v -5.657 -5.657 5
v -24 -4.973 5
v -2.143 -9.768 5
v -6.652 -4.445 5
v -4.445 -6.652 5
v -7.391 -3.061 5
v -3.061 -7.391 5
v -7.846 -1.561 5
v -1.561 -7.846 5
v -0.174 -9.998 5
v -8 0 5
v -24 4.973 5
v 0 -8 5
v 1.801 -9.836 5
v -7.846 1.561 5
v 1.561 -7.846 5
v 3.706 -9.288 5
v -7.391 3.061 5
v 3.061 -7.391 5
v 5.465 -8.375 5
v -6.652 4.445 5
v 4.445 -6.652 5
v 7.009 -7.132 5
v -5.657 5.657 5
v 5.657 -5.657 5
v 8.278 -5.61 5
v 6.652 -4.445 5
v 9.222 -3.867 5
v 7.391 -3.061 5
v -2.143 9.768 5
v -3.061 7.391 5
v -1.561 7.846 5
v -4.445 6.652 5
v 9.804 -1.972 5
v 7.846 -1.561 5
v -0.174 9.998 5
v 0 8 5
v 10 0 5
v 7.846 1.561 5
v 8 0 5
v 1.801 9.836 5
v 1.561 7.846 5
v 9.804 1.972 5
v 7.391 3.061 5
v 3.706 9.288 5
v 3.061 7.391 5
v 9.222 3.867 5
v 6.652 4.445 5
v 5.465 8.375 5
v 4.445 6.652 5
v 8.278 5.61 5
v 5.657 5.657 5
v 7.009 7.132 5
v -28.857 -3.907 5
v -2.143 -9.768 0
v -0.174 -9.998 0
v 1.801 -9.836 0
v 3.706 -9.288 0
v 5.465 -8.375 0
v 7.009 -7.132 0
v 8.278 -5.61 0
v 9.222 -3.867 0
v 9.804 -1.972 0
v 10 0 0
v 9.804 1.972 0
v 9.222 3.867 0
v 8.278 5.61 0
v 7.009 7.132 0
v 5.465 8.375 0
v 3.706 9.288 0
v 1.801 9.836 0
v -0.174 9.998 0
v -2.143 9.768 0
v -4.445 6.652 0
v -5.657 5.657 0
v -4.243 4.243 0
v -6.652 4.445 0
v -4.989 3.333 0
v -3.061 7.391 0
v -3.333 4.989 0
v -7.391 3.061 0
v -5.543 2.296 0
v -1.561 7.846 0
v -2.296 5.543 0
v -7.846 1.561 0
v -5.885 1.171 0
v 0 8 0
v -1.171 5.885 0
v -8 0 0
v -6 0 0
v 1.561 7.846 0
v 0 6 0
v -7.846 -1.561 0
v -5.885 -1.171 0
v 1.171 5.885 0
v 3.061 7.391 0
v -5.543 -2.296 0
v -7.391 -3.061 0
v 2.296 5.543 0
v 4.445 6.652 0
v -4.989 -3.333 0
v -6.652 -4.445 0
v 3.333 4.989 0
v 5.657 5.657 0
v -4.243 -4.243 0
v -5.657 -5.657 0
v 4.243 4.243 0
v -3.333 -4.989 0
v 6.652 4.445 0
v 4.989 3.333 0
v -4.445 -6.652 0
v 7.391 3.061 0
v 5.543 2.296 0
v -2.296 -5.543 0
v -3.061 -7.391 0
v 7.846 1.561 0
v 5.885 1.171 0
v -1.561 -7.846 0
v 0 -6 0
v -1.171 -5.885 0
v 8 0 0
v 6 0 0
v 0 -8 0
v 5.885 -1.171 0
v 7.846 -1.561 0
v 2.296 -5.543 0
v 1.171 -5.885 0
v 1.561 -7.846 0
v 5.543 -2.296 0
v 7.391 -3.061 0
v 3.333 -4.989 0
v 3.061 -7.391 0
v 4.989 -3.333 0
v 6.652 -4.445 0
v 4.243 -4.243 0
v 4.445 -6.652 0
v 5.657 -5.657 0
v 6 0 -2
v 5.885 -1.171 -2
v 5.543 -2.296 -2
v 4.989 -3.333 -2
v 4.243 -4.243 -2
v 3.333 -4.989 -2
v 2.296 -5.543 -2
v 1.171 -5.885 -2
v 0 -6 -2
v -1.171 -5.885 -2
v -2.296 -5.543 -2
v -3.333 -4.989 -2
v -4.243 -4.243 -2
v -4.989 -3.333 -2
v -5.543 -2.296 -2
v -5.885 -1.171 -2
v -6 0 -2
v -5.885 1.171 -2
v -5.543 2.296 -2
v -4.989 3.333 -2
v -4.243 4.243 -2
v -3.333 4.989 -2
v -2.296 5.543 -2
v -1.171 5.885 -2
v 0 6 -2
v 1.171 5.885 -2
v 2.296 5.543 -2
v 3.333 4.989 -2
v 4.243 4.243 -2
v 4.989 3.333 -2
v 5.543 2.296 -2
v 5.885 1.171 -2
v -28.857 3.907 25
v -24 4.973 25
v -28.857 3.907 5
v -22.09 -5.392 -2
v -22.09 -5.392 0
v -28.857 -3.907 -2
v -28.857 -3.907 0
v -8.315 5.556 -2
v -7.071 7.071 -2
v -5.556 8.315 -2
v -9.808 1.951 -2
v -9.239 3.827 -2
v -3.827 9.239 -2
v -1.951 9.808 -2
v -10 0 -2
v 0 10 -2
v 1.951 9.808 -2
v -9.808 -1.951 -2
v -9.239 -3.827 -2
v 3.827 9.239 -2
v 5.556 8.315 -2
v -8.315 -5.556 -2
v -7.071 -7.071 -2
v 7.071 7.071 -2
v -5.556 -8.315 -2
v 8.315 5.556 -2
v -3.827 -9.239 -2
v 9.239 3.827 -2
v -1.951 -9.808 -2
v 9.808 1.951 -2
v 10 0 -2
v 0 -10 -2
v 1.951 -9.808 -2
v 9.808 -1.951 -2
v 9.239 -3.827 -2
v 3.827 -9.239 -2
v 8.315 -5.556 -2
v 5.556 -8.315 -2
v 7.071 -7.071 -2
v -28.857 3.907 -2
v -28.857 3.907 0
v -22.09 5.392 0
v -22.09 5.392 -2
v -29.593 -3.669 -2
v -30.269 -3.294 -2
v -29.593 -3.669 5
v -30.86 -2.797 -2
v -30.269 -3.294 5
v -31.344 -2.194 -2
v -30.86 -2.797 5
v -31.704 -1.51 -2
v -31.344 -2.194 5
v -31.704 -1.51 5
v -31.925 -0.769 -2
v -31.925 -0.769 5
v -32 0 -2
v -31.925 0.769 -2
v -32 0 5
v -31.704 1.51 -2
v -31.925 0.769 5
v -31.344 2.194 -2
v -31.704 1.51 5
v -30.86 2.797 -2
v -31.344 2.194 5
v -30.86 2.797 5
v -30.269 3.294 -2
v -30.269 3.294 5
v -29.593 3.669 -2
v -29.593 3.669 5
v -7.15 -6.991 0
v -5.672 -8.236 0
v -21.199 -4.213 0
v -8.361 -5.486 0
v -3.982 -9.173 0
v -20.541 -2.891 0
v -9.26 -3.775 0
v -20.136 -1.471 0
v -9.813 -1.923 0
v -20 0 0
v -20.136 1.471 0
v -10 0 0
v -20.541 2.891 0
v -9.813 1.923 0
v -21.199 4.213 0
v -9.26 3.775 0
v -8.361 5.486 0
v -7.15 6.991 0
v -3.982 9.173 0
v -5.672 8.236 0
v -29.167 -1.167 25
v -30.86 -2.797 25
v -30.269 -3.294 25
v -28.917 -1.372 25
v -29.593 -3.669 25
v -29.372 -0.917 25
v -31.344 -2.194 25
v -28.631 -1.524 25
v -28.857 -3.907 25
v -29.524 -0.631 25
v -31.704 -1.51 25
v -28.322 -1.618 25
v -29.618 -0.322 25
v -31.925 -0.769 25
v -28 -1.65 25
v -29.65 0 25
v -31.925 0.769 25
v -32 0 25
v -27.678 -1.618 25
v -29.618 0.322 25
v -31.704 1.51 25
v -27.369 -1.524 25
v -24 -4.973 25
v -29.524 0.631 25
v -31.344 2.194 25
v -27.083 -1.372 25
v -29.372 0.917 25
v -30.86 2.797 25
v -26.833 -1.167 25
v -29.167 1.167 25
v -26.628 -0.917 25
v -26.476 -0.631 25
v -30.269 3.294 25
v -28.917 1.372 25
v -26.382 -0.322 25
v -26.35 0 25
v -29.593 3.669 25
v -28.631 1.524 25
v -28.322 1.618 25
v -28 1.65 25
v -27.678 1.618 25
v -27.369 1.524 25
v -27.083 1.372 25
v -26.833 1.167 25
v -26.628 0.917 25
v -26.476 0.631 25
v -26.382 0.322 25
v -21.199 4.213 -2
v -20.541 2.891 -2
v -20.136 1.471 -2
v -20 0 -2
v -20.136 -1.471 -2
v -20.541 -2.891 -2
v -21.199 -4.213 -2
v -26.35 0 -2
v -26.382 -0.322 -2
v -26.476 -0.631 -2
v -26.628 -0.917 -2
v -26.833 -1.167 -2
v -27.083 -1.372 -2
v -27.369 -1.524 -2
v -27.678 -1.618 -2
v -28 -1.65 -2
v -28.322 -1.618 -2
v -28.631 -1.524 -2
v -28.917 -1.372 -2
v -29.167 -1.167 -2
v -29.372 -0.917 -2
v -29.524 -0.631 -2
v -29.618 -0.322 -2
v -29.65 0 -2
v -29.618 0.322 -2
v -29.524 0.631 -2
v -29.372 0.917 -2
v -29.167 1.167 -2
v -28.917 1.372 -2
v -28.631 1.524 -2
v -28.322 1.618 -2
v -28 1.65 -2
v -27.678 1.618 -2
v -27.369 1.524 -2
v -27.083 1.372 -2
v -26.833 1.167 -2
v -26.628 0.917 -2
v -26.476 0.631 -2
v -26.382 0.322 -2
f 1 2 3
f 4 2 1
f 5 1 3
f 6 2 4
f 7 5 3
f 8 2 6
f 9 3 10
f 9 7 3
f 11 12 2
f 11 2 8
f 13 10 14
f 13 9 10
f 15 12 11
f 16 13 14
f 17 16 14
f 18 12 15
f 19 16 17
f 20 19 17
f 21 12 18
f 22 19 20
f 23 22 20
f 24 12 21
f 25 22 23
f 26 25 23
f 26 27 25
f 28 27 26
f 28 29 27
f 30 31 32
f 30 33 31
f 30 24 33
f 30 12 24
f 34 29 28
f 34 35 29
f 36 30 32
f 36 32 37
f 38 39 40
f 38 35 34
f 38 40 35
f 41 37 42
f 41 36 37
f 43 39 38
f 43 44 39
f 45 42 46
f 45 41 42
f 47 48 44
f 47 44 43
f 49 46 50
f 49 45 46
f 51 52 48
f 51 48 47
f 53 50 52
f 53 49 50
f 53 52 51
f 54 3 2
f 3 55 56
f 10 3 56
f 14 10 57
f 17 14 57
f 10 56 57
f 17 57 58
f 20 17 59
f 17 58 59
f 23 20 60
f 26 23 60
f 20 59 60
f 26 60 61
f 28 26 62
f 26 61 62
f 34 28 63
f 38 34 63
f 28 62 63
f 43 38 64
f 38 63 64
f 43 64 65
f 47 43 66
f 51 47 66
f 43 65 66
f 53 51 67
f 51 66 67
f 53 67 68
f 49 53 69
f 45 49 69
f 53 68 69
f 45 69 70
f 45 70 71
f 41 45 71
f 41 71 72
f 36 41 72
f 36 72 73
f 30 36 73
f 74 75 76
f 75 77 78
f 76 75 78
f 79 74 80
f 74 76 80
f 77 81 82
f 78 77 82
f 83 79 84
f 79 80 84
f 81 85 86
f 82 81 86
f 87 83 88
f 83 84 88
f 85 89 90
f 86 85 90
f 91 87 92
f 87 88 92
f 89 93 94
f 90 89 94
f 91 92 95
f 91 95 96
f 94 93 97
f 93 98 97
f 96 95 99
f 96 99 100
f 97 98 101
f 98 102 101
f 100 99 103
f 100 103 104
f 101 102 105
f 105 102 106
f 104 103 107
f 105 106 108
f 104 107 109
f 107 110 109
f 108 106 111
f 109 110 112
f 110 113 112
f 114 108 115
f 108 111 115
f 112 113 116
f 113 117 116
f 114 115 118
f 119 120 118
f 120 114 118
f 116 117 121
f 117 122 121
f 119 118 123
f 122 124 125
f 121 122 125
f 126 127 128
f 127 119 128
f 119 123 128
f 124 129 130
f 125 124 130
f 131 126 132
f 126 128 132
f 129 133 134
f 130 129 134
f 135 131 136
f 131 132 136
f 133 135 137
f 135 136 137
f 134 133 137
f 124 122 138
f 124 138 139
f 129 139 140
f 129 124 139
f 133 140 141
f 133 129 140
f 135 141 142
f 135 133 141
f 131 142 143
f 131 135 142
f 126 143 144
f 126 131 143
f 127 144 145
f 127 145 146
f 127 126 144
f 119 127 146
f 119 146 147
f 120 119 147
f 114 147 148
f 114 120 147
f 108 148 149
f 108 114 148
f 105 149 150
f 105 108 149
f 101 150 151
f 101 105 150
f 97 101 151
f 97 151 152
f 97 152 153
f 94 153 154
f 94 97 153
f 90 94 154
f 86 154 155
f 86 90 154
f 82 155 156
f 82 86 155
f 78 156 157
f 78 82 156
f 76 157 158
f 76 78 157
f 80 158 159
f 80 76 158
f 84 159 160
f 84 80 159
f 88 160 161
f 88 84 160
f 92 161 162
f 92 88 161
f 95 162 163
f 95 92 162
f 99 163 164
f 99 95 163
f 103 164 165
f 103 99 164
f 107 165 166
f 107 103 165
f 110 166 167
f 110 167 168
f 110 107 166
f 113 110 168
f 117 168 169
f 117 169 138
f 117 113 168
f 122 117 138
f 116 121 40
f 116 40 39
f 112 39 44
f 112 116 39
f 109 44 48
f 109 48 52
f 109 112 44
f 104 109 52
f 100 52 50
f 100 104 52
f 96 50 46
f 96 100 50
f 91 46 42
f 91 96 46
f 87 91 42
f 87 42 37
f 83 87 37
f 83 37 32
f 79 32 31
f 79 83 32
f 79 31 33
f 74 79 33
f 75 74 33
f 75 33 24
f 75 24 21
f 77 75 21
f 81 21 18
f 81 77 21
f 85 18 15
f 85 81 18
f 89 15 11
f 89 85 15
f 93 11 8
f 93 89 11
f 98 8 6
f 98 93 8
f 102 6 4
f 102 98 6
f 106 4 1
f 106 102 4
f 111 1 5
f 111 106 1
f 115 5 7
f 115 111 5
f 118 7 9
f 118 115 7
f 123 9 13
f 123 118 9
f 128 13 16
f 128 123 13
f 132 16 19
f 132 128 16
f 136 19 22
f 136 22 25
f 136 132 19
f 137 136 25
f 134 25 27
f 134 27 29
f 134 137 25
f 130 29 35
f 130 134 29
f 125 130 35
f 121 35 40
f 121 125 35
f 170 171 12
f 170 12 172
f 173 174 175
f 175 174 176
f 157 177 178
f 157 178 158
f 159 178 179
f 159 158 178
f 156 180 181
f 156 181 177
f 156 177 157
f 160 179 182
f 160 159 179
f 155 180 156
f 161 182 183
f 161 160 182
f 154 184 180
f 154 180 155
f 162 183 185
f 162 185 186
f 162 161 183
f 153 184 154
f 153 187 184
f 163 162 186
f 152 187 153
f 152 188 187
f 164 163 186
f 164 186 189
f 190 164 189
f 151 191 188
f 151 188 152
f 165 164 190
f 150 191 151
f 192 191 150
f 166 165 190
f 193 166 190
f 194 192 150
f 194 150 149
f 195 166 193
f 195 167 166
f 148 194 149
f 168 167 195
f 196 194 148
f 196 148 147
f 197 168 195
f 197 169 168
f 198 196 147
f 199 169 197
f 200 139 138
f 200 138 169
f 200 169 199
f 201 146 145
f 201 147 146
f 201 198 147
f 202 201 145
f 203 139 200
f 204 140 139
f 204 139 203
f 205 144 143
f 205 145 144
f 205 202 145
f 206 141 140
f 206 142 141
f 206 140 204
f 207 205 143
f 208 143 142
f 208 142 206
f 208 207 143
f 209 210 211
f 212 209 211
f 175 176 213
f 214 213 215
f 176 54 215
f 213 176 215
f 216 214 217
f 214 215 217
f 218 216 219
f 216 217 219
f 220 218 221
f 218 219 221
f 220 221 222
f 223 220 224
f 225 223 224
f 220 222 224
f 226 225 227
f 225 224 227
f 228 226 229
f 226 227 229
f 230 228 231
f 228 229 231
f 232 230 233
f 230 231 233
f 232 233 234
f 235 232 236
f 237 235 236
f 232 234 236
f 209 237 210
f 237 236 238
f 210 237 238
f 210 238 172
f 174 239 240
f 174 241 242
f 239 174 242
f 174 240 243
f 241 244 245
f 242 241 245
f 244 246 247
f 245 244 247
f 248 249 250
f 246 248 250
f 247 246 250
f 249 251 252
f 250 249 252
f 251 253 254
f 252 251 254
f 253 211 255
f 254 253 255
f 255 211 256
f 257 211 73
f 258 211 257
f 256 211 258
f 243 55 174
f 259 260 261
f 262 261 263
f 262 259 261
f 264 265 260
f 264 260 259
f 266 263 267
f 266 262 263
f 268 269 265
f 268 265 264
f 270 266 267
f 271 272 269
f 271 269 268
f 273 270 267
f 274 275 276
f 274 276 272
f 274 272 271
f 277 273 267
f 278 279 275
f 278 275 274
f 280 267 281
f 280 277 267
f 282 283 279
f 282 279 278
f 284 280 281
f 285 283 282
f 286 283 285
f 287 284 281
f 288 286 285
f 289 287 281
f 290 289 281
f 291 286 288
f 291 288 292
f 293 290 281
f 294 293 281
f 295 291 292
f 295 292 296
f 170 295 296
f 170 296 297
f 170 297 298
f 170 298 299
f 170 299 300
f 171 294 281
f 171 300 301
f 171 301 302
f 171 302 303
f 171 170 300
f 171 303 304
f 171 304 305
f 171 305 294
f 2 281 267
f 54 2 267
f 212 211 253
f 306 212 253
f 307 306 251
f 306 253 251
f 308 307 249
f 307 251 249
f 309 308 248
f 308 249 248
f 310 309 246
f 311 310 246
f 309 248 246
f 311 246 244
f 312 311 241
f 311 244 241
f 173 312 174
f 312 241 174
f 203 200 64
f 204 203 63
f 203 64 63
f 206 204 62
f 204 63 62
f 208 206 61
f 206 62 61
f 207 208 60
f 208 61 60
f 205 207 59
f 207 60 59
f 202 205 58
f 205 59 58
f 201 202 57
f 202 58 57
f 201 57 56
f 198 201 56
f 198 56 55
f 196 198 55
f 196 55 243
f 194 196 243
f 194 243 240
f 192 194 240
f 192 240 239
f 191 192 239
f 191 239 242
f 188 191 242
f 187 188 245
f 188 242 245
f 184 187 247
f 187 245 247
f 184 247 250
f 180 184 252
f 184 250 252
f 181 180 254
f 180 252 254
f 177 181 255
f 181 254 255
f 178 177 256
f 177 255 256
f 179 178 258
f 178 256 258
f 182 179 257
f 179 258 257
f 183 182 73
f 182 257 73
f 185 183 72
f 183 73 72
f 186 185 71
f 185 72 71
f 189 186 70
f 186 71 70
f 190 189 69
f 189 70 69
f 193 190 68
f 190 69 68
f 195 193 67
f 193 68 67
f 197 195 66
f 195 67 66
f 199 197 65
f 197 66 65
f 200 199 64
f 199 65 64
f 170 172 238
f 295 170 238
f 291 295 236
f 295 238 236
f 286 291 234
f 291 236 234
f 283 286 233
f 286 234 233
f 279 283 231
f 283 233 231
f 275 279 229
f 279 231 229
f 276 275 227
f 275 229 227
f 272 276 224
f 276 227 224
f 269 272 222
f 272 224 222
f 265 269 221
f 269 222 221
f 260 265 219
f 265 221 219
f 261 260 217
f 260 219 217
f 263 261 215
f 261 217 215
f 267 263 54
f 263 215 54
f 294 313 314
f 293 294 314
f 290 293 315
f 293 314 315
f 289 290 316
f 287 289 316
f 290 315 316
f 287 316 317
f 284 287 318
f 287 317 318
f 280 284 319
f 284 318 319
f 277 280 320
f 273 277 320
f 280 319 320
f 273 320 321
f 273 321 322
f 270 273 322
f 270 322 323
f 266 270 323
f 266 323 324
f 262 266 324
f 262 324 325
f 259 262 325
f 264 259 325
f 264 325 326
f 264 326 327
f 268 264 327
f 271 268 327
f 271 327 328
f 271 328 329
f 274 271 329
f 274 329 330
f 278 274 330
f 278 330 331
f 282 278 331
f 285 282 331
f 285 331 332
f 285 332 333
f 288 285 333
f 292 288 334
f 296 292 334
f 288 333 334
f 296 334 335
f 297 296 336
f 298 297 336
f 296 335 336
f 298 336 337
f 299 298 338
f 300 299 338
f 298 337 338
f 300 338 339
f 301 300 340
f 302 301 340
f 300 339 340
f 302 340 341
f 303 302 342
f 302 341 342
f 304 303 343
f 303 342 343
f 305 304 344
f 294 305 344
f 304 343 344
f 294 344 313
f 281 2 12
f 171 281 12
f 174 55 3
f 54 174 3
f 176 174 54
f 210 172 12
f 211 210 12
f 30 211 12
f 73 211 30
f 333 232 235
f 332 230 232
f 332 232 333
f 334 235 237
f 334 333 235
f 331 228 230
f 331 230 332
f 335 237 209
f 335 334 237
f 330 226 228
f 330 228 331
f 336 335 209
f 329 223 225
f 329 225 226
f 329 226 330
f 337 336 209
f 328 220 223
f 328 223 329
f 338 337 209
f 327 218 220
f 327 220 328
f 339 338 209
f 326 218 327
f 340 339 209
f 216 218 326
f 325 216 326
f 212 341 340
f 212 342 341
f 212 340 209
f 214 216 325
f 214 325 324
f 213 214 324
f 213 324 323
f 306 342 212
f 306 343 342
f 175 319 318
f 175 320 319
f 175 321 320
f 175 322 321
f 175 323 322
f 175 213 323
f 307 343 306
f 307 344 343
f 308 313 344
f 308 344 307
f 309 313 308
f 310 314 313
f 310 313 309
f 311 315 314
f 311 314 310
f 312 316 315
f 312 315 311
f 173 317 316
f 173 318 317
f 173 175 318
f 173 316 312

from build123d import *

# Parameters (mm, degrees)
SKETCH_R      = 8
PAD_DEPTH     = 5
PAD001_DEPTH  = 20
SKETCH002_R   = 10
SKETCH002_R_2 = 6
PAD002_DEPTH  = 2
PAD003_DEPTH  = 2
SKETCH004_R   = 1.65
POCKET_DEPTH  = 27.001


with BuildPart() as part:
    # Sketch → Pad (new body)
    with BuildSketch(Plane.XY):
        with BuildLine():
            ThreePointArc((-2.142857, -9.76771), (10, 0), (-2.142857, 9.76771))
            Line((-28.857143, 3.907084), (-2.142857, 9.76771))
            ThreePointArc((-28.857143, 3.907084), (-32, 0), (-28.857143, -3.907084))
            Line((-2.142857, -9.76771), (-28.857143, -3.907084))
        make_face()
        Circle(SKETCH_R, mode=Mode.SUBTRACT)
    extrude(amount=PAD_DEPTH)

    # Sketch001 (on Face7 of Pad) → Pad001 (join)
    with BuildSketch(Plane.XY.offset(5)):
        with BuildLine():
            ThreePointArc((-28.857143, 3.907084), (-32, -1.3e-05), (-28.857117, -3.90709))
            Line((-24, -4.972619), (-28.857117, -3.90709))
            Line((-24, -4.972619), (-24, 4.972653))
            Line((-24, 4.972653), (-28.857143, 3.907084))
        make_face()
    extrude(amount=PAD001_DEPTH)

    # Sketch002 → Pad002 (join)
    with BuildSketch(Plane(origin=(0, 0, 0), x_dir=(1, 0, 0), z_dir=(0, 0, -1))):
        Circle(SKETCH002_R)
        Circle(SKETCH002_R_2, mode=Mode.SUBTRACT)
    extrude(amount=PAD002_DEPTH)

    # Sketch003 (on Face7 of Pad002) → Pad003 (join)
    with BuildSketch(Plane(origin=(0, 0, 0), x_dir=(1, 0, 0), z_dir=(0, 0, -1))):
        with BuildLine():
            ThreePointArc((-28.857143, 3.907084), (-32, 0), (-28.857143, -3.907084))
            Line((-28.857143, -3.907084), (-22.089875, -5.391699))
            ThreePointArc((-22.089875, -5.391699), (-20, 0), (-22.089875, 5.391699))
            Line((-22.089875, 5.391699), (-28.857143, 3.907084))
        make_face()
    extrude(amount=PAD003_DEPTH)

    # Sketch004 (on Face18 of Pad003) → Pocket (cut, through all)
    with BuildSketch(Plane(origin=(0, 0, -2), x_dir=(1, 0, 0), z_dir=(0, 0, -1))):
        with Locations((-28, 0)):
            Circle(SKETCH004_R)
    extrude(amount=-POCKET_DEPTH, mode=Mode.SUBTRACT)


solid = part.part
